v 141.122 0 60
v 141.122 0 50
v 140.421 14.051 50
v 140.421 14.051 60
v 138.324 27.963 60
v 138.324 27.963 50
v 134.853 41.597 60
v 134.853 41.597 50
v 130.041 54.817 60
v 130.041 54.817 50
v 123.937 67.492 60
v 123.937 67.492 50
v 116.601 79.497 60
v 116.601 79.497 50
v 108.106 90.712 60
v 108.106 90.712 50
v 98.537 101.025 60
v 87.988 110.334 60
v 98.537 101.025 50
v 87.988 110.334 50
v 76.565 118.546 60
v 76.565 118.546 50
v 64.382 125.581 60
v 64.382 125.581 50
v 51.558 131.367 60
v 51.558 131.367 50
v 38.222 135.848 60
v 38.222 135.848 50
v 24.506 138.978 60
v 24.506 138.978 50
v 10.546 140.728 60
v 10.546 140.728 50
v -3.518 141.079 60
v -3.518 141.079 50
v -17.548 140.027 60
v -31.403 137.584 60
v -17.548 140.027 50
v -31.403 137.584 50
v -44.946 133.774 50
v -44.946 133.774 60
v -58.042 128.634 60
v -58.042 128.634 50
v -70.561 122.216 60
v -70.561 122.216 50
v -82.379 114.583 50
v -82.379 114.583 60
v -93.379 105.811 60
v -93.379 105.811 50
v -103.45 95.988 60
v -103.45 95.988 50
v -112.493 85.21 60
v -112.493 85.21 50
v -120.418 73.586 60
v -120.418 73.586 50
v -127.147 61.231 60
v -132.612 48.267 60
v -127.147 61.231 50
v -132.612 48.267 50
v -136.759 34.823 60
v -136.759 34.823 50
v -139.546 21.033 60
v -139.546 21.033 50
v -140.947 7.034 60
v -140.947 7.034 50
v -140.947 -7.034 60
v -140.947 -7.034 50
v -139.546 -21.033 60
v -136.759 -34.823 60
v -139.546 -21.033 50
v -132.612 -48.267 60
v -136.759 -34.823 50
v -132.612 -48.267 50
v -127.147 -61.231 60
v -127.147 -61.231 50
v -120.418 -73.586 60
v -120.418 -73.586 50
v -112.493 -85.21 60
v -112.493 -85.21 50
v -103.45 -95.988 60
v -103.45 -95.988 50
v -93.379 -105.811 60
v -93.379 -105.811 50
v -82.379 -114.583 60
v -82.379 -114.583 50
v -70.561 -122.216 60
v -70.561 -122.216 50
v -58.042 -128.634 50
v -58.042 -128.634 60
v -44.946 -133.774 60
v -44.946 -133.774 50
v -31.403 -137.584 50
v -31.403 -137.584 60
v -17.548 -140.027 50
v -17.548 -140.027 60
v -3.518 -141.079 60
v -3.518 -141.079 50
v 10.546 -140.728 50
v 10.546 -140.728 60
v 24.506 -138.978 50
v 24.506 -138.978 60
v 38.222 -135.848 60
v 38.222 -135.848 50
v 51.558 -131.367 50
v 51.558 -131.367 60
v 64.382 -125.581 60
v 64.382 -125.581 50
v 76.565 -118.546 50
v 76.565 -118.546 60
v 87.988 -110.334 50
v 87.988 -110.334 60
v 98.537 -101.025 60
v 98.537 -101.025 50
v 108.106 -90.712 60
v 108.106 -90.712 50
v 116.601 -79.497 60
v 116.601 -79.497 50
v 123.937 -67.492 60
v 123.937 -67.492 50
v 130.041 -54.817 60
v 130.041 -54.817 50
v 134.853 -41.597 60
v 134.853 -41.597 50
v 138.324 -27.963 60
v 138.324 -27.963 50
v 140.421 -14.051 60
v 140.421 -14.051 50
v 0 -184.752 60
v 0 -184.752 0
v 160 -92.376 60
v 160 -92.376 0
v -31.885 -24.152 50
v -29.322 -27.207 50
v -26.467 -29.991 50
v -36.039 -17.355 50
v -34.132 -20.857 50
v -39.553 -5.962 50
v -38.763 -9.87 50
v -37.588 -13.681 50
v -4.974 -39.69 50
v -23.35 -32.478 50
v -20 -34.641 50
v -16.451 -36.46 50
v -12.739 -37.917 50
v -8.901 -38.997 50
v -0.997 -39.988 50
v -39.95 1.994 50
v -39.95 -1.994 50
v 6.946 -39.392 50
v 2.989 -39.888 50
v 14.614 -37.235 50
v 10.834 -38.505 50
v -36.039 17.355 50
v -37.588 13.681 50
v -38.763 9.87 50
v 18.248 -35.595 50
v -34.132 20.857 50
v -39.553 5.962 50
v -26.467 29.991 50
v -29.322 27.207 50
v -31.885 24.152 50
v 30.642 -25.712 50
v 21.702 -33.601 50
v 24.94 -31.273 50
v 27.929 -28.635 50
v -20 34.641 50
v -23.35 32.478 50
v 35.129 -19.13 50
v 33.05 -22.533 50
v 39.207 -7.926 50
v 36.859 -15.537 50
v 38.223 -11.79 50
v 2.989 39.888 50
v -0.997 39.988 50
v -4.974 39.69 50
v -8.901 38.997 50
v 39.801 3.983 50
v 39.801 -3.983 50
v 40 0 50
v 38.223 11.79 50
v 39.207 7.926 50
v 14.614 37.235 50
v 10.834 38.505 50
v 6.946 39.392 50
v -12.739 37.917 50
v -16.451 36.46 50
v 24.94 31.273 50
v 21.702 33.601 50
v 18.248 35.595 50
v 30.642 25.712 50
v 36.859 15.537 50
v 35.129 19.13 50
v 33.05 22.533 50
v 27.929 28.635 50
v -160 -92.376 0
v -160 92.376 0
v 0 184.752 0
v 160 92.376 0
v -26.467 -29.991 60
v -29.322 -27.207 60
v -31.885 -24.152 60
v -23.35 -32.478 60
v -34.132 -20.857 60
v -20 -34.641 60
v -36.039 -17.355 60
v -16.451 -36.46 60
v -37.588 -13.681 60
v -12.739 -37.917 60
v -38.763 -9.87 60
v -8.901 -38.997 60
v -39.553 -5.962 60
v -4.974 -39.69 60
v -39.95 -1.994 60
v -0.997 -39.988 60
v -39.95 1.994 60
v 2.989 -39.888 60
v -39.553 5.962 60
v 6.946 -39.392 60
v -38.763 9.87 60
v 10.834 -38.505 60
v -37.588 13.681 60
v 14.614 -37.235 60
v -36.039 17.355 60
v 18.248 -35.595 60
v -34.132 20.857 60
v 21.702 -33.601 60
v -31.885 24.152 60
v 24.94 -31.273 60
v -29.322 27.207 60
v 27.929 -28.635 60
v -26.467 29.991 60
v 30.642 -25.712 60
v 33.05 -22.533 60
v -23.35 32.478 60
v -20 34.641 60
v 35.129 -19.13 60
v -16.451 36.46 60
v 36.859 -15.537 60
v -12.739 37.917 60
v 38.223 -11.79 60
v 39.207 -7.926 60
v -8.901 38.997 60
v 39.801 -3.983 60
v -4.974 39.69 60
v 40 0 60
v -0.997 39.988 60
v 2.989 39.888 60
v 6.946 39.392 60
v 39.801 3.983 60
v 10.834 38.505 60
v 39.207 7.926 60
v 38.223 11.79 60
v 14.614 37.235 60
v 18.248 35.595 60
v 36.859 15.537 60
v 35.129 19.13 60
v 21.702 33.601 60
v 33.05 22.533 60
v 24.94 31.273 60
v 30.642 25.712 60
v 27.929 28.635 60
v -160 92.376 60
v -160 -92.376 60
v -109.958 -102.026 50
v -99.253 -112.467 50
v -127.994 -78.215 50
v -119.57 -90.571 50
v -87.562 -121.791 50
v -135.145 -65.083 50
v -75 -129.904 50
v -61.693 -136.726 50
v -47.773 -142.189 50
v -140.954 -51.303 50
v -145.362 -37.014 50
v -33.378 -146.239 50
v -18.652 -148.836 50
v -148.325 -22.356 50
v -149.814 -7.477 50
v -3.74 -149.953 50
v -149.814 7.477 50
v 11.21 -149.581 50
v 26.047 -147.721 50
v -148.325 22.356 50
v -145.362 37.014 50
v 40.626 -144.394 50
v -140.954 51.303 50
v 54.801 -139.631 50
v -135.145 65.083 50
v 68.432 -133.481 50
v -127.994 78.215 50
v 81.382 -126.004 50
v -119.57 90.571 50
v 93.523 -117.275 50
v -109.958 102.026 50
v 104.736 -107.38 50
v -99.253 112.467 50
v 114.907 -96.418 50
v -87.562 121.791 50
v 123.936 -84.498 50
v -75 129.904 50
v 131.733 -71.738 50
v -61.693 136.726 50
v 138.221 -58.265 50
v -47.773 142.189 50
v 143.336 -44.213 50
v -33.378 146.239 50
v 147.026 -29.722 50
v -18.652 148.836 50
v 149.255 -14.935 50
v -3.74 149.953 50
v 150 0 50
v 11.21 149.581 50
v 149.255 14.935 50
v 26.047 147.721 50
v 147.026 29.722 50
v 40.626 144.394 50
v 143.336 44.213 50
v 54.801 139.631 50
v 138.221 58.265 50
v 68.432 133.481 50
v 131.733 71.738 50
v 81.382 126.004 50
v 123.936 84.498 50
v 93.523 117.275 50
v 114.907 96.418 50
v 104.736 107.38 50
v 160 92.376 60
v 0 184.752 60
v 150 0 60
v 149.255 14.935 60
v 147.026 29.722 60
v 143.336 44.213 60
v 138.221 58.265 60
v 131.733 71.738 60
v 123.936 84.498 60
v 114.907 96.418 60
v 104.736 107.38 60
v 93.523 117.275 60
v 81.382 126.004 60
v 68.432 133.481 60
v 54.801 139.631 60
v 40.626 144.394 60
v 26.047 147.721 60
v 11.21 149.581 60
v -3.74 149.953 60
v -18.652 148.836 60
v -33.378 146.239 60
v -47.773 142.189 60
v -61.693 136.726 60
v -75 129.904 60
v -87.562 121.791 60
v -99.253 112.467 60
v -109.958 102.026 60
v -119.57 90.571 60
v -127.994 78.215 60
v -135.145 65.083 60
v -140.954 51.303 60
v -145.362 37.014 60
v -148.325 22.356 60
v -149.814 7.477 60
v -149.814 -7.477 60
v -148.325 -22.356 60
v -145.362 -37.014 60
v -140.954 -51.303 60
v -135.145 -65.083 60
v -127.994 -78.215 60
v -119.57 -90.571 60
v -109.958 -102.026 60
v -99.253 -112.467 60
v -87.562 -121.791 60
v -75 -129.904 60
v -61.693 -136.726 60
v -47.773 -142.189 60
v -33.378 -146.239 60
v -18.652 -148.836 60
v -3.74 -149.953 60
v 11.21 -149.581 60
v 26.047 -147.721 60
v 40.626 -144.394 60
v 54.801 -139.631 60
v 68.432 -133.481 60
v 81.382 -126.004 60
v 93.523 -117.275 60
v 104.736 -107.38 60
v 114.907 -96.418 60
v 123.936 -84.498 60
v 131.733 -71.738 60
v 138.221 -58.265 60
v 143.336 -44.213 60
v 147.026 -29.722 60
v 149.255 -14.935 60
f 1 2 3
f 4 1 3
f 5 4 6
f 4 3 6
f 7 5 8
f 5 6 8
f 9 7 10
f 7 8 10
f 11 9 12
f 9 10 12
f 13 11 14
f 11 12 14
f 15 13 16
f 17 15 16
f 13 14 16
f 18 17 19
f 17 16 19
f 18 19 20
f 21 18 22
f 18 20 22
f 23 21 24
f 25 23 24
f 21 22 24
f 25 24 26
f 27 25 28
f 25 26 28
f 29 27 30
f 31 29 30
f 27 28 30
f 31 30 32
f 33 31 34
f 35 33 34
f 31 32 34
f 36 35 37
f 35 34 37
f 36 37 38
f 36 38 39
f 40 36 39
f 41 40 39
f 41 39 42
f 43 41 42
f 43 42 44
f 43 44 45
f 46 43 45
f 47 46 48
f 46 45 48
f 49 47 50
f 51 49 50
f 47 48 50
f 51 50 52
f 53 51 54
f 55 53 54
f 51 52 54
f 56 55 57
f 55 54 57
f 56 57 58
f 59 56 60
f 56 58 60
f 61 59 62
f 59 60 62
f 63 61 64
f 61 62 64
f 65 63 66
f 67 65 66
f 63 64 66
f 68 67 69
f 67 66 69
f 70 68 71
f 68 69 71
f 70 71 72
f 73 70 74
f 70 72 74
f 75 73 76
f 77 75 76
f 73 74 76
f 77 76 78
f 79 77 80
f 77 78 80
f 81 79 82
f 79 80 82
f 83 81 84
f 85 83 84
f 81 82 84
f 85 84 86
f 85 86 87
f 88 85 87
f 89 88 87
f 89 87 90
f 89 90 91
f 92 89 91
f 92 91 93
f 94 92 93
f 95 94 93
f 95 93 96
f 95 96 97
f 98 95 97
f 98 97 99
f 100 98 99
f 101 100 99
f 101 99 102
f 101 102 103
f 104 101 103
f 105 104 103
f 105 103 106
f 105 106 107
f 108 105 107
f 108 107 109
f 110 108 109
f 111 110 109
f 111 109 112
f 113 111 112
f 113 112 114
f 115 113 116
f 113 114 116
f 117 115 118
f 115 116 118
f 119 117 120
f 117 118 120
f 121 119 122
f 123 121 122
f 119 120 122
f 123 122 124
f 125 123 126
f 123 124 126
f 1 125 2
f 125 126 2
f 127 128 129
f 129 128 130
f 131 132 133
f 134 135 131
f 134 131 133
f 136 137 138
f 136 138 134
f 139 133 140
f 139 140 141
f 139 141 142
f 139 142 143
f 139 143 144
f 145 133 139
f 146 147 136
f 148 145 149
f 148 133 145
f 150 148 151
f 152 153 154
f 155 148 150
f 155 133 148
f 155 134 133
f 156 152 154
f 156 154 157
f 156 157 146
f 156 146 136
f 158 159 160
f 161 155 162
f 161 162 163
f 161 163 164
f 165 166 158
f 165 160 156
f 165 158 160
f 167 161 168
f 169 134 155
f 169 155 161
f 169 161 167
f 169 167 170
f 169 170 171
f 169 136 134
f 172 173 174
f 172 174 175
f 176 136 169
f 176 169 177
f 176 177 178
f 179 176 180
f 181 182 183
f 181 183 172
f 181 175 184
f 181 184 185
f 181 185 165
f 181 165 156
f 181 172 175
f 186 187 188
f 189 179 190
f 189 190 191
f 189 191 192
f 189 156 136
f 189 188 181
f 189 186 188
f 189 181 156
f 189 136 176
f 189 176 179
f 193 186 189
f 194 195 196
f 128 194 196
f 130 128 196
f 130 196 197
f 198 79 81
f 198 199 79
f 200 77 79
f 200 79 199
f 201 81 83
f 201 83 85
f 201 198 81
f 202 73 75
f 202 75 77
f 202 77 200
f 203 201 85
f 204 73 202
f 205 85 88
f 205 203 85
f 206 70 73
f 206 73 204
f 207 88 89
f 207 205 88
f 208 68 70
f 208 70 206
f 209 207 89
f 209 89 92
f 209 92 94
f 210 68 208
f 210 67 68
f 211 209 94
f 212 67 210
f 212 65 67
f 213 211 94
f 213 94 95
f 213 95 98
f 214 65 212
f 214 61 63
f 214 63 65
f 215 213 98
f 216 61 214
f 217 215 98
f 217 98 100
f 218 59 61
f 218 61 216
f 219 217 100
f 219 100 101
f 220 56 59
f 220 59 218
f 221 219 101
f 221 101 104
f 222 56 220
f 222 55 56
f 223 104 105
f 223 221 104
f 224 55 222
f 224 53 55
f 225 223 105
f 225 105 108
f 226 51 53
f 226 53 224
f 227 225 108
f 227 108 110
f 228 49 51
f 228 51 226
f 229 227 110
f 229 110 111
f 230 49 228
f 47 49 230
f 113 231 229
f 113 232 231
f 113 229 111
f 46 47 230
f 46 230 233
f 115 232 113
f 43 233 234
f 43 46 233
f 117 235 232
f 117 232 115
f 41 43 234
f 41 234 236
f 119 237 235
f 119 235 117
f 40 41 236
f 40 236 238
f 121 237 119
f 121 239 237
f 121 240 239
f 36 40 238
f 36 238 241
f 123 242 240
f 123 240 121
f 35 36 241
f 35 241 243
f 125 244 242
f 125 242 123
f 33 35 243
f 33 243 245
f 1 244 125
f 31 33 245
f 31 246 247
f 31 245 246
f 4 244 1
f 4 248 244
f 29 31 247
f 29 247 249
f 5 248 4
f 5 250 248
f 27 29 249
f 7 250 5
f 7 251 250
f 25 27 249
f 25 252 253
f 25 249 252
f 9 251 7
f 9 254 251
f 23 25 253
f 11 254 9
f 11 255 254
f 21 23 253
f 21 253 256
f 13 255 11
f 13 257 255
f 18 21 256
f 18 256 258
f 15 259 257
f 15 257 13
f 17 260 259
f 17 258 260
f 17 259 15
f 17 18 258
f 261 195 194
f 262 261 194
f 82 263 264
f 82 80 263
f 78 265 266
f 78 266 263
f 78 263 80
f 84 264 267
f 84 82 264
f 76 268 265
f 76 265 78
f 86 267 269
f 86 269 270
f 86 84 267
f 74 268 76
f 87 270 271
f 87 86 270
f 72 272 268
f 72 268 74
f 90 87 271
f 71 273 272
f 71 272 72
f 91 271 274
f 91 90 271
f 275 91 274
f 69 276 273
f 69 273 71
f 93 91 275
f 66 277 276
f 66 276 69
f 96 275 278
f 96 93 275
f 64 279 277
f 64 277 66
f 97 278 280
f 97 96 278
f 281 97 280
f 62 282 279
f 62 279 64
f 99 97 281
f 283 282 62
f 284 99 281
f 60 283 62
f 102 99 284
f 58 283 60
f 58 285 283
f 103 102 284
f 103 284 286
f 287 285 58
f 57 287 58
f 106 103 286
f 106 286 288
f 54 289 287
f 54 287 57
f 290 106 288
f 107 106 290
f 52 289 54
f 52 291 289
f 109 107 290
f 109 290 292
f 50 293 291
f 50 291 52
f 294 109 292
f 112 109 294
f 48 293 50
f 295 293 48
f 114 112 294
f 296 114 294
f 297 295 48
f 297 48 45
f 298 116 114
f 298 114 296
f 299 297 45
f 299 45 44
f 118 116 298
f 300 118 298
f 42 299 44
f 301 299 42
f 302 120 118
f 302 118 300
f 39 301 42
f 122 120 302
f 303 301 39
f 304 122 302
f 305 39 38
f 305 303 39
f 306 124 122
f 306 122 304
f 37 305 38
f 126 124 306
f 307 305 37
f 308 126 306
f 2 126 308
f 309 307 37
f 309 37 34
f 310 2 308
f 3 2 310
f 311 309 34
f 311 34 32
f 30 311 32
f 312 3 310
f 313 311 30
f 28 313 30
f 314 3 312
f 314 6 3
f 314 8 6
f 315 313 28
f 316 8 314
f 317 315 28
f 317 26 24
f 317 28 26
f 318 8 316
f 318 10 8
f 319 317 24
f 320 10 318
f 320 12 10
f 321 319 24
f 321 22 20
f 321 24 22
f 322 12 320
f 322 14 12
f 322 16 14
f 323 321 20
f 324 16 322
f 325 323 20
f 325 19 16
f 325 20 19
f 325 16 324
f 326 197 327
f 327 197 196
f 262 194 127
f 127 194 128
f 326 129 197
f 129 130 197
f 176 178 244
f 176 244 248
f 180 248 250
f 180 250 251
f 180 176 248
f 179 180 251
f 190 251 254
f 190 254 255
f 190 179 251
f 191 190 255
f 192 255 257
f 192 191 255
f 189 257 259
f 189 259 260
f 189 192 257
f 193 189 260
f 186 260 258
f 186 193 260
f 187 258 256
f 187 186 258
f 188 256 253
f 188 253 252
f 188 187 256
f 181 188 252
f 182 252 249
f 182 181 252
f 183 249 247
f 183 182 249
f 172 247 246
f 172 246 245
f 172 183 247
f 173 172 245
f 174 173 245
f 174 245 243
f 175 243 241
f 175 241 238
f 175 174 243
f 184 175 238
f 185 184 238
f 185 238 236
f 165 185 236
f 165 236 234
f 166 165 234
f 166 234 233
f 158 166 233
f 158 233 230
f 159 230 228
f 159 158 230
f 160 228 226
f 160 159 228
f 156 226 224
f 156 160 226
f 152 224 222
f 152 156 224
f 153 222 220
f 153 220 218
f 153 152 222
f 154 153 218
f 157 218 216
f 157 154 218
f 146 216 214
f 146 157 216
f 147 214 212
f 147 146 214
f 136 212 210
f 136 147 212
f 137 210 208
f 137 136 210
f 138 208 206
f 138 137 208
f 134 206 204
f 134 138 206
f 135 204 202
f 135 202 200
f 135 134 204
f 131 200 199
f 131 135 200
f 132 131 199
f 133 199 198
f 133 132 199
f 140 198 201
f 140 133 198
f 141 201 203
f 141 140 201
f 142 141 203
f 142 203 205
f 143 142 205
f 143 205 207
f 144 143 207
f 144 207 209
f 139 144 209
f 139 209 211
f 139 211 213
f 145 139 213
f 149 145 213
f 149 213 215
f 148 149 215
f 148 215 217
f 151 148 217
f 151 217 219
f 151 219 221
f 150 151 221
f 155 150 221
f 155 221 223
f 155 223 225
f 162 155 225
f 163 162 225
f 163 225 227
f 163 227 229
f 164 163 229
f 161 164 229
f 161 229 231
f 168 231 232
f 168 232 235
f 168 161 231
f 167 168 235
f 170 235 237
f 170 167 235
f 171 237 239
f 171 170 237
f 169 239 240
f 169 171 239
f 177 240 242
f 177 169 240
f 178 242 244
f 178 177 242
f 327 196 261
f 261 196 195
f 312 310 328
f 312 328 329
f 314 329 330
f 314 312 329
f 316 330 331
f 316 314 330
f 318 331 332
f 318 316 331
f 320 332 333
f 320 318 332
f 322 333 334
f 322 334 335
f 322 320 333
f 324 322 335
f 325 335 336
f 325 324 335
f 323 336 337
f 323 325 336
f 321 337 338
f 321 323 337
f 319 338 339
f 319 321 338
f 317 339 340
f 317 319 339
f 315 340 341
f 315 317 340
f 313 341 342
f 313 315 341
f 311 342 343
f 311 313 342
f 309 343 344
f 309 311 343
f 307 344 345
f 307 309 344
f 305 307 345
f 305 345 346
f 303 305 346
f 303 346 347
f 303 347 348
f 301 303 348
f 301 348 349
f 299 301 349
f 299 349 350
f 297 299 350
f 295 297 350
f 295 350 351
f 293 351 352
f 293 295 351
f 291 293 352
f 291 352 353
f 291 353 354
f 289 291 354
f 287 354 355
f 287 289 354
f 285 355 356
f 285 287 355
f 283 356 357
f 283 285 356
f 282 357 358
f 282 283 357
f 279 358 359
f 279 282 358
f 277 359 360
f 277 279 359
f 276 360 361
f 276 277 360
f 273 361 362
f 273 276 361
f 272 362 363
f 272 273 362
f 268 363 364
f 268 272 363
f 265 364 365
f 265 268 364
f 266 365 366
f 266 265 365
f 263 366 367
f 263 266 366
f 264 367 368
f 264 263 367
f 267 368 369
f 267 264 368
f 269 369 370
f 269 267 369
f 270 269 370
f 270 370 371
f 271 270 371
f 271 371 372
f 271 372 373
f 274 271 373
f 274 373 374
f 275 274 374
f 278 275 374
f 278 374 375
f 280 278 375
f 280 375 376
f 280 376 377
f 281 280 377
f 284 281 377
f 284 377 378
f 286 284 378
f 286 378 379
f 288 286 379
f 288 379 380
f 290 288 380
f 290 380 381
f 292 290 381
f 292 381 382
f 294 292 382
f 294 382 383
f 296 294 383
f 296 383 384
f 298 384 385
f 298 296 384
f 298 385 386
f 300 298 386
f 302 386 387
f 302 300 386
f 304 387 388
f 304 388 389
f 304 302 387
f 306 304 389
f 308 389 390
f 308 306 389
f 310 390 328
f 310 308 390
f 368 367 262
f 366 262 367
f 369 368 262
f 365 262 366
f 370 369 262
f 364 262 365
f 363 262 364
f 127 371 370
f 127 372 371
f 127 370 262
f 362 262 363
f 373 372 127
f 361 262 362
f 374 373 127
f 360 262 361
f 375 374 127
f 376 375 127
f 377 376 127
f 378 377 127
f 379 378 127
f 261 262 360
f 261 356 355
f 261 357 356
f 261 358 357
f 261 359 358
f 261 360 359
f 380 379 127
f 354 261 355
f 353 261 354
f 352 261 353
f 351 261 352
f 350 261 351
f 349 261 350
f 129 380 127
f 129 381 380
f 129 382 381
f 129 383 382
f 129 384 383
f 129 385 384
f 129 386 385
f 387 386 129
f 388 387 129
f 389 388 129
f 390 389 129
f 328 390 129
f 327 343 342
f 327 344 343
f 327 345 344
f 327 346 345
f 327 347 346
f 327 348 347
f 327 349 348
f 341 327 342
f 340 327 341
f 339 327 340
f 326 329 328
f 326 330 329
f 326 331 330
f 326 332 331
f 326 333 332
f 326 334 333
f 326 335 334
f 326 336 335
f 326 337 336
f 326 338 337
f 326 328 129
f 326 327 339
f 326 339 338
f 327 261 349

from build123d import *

# Parameters (mm, degrees)
F1_DEPTH = 50
F3_R     = 150
F4_DEPTH = 10
F3_R_2   = 141.1224
F3_R_3   = 40
F5_DEPTH = 10


with BuildPart() as f1:
    # F0 (on Top) → F1 (new body)
    with BuildSketch(Plane.XY):
        Polygon((160, -92.376043), (160, 92.376043), (0, 184.752086), (-160, 92.376043), (-160, -92.376043), (0, -184.752086), align=None)
    extrude(amount=F1_DEPTH)

    # F3 (on face) → F4 (join)
    with BuildSketch(Plane.XY.offset(50)):
        Polygon((-160, -92.376043), (0, -184.752086), (160, -92.376043), (160, 92.376043), (0, 184.752086), (-160, 92.376043), align=None)
        Circle(F3_R, mode=Mode.SUBTRACT)
    extrude(amount=F4_DEPTH)

    # F3 (on face) → F5 (join)
    with BuildSketch(Plane.XY.offset(50)):
        Circle(F3_R_2)
        Circle(F3_R_3, mode=Mode.SUBTRACT)
    extrude(amount=F5_DEPTH)


solid = f1.part
